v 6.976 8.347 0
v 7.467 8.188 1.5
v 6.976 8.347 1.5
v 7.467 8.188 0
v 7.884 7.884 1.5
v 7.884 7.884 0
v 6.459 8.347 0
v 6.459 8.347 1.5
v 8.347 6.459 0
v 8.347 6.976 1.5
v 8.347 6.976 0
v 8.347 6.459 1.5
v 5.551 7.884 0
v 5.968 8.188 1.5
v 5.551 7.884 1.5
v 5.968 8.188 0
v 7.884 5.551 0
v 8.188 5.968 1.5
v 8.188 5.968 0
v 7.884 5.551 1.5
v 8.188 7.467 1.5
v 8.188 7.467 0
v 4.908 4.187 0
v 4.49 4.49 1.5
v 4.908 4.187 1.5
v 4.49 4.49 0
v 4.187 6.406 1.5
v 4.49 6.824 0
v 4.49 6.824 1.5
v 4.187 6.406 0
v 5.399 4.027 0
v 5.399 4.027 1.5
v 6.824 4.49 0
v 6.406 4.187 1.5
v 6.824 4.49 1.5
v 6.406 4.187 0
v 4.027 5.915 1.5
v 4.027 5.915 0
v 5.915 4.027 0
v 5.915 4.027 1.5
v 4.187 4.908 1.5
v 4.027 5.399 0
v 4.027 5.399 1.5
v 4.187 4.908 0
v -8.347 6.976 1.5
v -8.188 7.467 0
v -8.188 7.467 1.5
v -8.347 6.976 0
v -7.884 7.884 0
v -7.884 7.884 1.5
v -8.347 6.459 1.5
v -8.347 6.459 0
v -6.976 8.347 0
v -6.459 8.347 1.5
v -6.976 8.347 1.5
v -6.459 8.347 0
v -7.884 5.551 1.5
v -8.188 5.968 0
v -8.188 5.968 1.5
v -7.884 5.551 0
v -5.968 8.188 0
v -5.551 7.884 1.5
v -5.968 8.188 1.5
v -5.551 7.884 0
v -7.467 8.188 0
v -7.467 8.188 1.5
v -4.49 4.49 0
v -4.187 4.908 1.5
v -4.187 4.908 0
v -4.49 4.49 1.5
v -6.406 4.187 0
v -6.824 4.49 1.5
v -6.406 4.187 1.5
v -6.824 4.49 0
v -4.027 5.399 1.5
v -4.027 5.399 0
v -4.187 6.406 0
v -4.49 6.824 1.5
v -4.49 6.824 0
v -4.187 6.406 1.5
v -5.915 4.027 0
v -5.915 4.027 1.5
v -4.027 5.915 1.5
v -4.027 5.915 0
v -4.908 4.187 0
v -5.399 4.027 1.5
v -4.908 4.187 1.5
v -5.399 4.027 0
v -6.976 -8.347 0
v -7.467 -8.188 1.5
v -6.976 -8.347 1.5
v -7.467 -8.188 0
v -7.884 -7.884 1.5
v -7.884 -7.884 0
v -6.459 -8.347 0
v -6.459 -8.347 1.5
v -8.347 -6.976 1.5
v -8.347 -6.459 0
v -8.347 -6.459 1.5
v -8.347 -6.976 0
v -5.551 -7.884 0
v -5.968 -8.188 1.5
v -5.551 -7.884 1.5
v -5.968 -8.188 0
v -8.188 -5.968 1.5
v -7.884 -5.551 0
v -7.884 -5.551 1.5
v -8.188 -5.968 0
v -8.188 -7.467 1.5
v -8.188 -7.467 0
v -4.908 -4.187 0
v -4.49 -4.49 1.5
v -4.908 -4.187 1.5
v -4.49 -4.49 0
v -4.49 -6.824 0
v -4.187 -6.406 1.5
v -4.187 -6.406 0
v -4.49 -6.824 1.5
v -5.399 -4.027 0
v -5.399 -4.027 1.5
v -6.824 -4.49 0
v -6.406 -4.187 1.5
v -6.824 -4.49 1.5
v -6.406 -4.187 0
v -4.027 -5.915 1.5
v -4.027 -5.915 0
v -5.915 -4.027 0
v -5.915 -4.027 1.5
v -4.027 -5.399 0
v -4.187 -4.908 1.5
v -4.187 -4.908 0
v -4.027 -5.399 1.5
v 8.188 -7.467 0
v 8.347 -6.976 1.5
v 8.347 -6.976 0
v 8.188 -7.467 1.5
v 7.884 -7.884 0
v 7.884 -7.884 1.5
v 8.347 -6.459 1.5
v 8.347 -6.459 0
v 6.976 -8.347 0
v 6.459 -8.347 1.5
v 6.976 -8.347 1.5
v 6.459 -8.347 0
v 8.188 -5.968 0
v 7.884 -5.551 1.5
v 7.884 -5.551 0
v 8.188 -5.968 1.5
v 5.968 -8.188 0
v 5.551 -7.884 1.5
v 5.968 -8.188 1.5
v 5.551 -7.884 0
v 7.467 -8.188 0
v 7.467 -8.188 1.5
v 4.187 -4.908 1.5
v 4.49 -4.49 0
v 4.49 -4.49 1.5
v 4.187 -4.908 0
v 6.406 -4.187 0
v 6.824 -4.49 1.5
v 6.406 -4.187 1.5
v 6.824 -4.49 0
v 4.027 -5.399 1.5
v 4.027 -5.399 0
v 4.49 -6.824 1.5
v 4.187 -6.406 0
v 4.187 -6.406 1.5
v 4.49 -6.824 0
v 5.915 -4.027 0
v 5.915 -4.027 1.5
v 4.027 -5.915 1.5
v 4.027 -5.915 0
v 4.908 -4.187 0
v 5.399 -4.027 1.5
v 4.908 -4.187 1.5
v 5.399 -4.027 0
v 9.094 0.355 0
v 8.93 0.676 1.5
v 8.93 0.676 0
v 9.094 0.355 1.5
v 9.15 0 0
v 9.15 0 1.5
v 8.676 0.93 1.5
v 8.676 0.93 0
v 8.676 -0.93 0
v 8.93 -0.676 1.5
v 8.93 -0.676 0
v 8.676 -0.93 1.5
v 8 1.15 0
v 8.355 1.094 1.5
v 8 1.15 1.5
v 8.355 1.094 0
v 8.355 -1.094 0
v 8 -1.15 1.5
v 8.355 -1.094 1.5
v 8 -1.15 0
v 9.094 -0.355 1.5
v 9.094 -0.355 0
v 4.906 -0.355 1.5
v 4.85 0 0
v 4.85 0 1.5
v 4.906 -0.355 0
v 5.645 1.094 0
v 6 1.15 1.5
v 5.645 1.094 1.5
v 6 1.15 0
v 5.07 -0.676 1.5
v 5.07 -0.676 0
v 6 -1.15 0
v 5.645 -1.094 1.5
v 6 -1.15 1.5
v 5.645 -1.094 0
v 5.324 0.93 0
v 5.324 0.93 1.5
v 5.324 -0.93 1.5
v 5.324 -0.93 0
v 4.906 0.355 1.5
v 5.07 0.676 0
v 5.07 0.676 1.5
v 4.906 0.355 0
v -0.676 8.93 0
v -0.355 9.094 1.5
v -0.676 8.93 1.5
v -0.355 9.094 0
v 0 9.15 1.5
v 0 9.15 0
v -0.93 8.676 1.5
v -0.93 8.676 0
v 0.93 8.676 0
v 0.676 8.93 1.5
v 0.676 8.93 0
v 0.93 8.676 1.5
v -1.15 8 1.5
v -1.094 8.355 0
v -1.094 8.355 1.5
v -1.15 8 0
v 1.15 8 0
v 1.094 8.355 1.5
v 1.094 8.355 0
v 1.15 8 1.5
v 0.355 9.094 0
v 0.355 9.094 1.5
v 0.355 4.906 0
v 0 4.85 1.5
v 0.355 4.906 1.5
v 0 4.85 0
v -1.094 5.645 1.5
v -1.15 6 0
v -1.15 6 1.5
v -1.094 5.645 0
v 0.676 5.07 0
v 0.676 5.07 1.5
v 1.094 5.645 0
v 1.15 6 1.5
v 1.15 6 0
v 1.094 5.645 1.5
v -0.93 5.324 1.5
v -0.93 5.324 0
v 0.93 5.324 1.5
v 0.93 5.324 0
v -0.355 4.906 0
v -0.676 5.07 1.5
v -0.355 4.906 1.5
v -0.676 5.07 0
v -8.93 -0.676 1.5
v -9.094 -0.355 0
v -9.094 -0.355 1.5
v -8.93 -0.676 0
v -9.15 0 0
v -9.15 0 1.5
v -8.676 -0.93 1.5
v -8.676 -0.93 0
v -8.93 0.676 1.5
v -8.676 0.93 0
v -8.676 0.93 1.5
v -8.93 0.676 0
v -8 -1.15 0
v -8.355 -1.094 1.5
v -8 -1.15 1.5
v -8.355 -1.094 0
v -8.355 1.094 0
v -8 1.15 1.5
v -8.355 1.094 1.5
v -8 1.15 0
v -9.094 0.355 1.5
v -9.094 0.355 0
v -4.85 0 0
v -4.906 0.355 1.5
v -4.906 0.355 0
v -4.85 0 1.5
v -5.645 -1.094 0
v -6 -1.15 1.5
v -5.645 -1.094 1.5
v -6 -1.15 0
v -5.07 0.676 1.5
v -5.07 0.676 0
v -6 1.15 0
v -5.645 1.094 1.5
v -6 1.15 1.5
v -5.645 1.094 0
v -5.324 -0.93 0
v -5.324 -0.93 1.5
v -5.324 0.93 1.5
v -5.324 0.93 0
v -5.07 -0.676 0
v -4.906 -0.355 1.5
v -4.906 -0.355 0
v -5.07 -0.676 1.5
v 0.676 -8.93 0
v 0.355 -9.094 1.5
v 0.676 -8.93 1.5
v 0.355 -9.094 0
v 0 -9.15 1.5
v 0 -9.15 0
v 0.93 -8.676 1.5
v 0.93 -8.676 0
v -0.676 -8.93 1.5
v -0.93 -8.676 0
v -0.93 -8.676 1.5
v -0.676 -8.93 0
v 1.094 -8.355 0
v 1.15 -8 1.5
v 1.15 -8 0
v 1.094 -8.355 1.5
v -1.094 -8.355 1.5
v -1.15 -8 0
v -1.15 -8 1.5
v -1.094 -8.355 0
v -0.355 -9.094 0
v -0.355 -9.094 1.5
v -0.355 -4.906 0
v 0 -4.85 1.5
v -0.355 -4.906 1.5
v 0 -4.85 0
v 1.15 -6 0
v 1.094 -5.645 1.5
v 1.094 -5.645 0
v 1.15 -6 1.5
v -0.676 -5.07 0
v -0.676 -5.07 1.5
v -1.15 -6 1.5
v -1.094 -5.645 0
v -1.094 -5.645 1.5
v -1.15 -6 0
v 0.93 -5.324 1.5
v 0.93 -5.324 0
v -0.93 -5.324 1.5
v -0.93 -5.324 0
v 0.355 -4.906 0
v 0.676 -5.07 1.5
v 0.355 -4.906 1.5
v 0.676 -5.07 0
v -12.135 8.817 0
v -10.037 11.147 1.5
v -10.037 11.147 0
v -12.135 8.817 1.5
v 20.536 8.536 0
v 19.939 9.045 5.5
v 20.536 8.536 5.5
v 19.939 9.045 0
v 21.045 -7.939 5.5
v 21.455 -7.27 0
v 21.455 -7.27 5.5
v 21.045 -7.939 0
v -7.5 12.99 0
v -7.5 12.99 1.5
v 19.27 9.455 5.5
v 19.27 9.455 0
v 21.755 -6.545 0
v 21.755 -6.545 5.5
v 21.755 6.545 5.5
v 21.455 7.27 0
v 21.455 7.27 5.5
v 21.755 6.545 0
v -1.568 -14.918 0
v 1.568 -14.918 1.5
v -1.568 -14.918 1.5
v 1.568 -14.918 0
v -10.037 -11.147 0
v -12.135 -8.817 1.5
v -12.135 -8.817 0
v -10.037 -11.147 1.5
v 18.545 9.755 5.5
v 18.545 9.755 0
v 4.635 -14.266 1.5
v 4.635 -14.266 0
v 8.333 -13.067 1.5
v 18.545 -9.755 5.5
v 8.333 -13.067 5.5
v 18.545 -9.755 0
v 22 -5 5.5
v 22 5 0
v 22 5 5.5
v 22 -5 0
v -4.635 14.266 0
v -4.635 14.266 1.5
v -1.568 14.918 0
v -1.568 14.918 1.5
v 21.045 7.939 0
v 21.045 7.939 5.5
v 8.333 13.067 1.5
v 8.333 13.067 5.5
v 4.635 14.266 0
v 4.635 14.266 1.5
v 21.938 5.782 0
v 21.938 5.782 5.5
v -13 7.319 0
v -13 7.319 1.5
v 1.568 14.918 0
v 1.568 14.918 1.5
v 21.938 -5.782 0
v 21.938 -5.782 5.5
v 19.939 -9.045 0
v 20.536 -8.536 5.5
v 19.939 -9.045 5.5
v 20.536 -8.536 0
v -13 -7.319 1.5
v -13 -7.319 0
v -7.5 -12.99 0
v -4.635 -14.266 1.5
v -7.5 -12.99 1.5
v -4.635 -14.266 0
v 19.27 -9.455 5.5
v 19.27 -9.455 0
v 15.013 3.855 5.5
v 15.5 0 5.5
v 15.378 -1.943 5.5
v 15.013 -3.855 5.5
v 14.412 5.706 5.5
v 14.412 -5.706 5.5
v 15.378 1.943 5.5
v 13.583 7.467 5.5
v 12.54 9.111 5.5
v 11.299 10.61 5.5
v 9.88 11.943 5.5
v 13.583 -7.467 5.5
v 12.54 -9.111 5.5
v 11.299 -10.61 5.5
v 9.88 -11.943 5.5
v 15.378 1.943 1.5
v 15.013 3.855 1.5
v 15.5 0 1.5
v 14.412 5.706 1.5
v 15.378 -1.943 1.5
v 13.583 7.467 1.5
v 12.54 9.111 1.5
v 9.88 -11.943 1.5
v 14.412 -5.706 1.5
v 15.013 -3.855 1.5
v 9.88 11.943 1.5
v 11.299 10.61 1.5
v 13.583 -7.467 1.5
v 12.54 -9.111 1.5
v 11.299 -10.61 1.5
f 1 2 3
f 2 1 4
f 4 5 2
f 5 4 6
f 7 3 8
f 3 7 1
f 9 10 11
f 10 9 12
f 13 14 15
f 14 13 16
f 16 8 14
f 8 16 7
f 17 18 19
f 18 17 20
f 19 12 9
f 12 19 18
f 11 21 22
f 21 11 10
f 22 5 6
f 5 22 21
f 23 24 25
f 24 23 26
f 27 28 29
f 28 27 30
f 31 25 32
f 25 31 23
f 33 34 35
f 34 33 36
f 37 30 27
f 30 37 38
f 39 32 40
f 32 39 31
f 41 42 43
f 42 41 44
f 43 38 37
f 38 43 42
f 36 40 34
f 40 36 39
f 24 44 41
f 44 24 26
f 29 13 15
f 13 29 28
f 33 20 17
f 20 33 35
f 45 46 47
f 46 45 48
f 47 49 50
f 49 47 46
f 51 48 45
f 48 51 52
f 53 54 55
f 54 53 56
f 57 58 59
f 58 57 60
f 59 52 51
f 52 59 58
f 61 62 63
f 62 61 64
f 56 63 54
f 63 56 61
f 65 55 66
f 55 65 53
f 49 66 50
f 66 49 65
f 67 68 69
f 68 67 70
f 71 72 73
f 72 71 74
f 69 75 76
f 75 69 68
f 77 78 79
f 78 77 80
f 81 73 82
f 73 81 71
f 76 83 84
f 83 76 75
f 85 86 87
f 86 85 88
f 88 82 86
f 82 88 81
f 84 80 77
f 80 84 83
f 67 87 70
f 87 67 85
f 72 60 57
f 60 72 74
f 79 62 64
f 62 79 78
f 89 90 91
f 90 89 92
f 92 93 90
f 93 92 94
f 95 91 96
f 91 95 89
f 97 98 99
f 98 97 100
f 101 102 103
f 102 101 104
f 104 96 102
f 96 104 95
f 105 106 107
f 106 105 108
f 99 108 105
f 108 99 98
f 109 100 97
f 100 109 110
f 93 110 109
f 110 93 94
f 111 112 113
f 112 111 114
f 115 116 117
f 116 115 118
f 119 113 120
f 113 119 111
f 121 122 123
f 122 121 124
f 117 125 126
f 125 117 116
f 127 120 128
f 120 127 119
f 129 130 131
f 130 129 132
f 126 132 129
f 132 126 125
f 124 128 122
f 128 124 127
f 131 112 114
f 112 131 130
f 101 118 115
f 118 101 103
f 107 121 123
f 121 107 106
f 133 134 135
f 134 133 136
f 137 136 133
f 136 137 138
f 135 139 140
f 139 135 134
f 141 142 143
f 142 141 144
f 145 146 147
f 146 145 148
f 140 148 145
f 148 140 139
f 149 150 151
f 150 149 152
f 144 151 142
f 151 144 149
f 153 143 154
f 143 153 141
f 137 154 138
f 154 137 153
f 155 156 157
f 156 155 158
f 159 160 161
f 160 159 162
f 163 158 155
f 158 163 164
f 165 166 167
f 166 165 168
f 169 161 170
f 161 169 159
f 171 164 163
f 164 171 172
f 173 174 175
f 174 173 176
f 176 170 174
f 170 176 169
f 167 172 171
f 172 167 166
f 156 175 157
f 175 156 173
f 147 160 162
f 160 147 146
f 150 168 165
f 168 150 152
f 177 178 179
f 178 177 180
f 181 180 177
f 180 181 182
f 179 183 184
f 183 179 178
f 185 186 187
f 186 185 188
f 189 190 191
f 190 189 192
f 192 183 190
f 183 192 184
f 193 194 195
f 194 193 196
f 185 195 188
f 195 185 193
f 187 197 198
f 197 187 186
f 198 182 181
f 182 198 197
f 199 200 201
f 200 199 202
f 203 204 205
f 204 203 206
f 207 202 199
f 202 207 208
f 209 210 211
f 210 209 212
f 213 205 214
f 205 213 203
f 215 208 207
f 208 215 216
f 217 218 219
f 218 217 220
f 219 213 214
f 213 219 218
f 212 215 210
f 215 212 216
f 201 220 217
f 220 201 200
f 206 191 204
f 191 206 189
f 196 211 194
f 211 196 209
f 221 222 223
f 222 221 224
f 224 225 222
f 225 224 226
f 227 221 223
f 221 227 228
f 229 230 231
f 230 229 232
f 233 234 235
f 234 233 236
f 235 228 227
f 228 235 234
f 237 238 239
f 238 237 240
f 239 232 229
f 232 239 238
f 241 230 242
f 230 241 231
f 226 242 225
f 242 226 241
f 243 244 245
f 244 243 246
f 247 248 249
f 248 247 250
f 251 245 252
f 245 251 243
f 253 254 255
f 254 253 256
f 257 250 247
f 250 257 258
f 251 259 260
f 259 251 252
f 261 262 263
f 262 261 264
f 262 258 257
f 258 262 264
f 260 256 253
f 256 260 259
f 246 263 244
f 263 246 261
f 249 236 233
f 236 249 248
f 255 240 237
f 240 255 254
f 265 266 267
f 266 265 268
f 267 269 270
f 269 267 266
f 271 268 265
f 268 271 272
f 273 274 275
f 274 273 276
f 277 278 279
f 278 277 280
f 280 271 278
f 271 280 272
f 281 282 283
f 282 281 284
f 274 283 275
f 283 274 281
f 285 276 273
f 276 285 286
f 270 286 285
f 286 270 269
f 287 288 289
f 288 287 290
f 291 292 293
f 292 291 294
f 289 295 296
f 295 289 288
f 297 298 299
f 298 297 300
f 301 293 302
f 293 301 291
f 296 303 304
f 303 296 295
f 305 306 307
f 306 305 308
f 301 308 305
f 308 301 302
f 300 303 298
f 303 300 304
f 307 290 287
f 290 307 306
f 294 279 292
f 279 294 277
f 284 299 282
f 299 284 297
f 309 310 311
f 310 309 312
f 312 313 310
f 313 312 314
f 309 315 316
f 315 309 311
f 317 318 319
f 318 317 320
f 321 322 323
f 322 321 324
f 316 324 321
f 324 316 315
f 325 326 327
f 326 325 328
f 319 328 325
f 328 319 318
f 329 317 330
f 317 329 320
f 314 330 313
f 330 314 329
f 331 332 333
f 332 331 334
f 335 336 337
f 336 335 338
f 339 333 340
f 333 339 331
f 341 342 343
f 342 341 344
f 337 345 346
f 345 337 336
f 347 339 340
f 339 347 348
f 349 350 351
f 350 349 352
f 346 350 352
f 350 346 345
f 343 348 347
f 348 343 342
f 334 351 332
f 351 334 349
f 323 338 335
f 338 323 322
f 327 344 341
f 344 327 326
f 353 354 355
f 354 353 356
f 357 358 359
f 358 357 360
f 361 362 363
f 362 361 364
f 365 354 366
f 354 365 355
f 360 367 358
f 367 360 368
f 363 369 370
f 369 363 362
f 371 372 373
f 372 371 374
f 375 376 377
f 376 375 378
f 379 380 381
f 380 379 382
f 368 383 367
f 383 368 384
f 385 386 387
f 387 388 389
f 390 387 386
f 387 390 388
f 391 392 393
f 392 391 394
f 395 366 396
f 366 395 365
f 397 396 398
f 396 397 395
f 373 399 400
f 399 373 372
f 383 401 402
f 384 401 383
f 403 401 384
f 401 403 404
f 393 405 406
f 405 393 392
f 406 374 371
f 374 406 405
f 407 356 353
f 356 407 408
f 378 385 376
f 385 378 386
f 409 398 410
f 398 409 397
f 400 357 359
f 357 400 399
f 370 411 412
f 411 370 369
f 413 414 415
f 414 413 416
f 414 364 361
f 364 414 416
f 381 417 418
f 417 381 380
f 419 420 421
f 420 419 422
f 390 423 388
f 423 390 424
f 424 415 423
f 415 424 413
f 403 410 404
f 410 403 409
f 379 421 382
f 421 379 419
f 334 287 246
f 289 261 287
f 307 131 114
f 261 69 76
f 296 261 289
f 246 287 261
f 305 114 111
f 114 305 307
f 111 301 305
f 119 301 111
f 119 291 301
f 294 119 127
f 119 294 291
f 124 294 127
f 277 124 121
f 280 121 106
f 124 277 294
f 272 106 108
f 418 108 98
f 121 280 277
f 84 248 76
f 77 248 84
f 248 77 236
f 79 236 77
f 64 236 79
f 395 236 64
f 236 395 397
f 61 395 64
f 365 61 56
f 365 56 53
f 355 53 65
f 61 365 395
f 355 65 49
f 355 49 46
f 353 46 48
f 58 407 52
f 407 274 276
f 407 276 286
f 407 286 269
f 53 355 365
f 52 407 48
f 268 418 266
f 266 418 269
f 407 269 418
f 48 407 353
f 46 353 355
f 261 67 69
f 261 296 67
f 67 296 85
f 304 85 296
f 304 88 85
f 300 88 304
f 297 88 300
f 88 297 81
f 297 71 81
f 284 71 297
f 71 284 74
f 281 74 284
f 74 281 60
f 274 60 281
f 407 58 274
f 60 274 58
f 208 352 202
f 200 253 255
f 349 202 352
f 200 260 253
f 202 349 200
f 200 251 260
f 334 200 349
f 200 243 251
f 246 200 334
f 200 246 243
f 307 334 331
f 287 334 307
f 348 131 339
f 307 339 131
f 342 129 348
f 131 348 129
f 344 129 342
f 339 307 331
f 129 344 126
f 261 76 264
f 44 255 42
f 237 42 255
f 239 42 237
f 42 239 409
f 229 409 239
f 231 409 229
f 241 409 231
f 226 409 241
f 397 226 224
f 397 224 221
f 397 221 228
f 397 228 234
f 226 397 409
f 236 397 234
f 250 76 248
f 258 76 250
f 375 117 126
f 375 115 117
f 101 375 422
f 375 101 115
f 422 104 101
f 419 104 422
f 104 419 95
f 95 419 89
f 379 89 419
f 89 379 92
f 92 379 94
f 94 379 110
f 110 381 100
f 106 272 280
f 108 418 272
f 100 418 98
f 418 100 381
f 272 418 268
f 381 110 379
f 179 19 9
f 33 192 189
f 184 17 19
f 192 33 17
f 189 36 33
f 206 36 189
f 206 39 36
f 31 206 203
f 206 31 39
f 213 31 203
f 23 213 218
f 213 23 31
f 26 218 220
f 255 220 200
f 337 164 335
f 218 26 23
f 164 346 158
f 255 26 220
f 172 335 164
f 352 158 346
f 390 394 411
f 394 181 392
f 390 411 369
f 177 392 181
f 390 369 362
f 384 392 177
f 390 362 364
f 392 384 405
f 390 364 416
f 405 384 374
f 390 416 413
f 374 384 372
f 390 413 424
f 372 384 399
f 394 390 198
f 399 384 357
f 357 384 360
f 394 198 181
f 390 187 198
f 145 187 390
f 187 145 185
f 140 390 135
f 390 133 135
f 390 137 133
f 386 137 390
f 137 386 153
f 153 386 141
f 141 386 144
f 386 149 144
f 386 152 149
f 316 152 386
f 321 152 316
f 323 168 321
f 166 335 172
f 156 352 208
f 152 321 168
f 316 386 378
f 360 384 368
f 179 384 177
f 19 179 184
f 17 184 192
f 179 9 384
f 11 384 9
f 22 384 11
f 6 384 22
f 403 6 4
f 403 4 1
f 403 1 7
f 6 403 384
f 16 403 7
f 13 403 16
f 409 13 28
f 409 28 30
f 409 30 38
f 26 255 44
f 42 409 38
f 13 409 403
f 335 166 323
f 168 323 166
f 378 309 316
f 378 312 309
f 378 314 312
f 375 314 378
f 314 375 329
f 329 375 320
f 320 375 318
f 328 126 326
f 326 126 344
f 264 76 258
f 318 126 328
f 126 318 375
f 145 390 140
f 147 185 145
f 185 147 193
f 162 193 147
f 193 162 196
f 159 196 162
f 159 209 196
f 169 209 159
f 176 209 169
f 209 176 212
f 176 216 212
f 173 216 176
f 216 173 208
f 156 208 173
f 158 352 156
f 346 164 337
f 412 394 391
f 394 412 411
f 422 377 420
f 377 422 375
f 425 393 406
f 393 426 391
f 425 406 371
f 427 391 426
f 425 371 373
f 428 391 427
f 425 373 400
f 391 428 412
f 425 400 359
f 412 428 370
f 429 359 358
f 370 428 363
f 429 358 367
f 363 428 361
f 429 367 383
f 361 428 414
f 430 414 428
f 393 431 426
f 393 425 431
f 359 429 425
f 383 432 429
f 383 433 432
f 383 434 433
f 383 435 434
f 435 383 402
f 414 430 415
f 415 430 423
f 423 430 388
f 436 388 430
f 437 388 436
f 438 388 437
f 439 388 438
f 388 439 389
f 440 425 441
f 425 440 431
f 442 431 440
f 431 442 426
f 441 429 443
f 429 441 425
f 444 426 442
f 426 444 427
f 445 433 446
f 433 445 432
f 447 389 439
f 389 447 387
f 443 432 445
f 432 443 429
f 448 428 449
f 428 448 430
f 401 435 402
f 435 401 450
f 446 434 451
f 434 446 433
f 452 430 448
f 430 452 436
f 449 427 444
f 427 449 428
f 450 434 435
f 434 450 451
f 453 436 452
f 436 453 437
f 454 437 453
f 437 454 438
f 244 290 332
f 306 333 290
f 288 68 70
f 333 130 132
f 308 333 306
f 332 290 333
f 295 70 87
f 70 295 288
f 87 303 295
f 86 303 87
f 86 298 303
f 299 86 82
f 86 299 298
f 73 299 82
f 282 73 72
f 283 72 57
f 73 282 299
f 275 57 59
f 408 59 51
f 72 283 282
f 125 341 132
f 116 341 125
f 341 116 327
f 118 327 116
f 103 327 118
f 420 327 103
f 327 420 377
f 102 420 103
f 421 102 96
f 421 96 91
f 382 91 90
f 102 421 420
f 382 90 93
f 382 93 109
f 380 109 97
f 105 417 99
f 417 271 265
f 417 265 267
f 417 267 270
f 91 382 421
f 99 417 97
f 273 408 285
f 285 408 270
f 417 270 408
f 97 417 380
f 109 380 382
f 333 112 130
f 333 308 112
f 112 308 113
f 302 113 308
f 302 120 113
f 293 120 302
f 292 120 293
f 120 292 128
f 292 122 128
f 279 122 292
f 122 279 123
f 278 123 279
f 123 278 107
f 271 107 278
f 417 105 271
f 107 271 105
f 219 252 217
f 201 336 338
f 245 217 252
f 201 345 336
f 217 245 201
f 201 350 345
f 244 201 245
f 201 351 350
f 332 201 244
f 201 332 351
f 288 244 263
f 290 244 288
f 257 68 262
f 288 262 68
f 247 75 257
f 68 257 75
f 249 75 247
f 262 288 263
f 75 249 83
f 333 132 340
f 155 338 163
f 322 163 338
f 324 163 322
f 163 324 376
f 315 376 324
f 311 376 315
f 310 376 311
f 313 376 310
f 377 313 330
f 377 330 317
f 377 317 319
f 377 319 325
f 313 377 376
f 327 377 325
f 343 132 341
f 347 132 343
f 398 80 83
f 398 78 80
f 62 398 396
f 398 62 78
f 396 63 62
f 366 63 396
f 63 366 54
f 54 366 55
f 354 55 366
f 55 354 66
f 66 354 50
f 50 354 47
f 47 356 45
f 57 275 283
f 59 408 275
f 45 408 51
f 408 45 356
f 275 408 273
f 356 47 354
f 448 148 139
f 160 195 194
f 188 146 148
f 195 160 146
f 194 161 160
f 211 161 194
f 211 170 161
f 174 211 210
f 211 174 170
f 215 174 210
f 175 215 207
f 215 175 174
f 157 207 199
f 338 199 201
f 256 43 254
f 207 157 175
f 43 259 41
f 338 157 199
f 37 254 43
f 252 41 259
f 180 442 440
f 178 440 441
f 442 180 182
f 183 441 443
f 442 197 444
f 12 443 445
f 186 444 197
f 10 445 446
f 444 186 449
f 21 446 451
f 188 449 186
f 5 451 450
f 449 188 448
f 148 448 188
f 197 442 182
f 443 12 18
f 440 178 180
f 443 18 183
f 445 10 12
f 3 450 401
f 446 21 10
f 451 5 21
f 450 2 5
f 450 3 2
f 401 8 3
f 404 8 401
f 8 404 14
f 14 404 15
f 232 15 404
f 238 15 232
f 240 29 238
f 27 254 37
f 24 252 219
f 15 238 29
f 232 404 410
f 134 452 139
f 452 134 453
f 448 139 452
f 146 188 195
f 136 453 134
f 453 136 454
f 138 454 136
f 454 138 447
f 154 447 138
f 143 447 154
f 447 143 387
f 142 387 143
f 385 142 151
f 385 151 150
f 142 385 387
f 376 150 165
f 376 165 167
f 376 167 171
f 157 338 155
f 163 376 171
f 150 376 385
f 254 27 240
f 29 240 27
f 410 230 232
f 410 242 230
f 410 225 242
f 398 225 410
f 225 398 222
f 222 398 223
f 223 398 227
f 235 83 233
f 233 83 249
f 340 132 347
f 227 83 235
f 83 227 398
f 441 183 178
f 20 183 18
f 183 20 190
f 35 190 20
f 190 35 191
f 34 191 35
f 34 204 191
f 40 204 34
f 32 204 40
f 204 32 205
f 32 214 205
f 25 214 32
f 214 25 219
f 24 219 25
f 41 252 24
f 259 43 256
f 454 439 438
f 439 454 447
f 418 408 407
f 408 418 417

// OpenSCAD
// file: dronePlates.scad
/**
 * dronePlates.scad
 * Plate library
 *
 * GNU GPL V3
 * @author: Victor Potenciano
 */

m3Rad = 3.4/2;
cornerR = 4;

/**
 *
 */
module helperDisk(diameter) {
	cylinder(r = diameter/2, h = 0.6, $fn=20);
}

/**
 *
 */
module roundedRect(size, radius) {
	x = size[0];
	y = size[1];
	z = size[2];

	linear_extrude(height=z)
	hull() {
	// place 4 circles in the corners, with the given radius
	translate([(-x/2)+(radius/2), (-y/2)+(radius/2), 0]){ circle(r=radius); }
	translate([(x/2)-(radius/2), (-y/2)+(radius/2), 0]){ circle(r=radius); }
	translate([(-x/2)+(radius/2), (y/2)-(radius/2), 0]){ circle(r=radius); }
	translate([(x/2)-(radius/2), (y/2)-(radius/2), 0]){ circle(r=radius); }
	}
}

/**
 * rounded rectangle triangle with corner at origin
 */
module roundedTriangle(size, radius) {
	x = size[0];
	y = size[1];
	z = size[2];

	linear_extrude(height=z)
	hull() {
	translate([radius, radius, 0]){ circle(r=radius); }
	translate([x-radius, radius, 0]){ circle(r=radius); }
	translate([radius, y-radius, 0]){ circle(r=radius); }
	}
}

/**
 *
 */
module roundRectPlate(w, l, plateThick=3) {
	difference(){
		roundedRect([l+m3Rad*1.75,w+m3Rad*1.75,plateThick], cornerR);
		translate([l/2, w/2, -0.5]) { cylinder(h = plateThick+1, r = m3Rad, $fn=30); }
		translate([-l/2, w/2, -0.5]) { cylinder(h = plateThick+1, r = m3Rad, $fn=30); }
		translate([l/2, -w/2, -0.5]) { cylinder(h = plateThick+1, r = m3Rad, $fn=30); }
		translate([-l/2, -w/2, -0.5]) { cylinder(h = plateThick+1, r = m3Rad, $fn=30); }
	}
}

/**
 *
 */
module crossSquarePlate(l, thick=3) {
	inDist = cornerR*2+4;
	trianL = sqrt((l*l)/2)-inDist;
	centerR = 4;

	difference(){
		roundRectPlate(l, l, thick);
		translate([0, centerR, -0.5]) { 
			rotate([0,0,45]){ roundedTriangle([trianL,trianL,thick+1], cornerR-2); }
		}
		translate([0, -centerR, -0.5]) { 
			rotate([0,0,225]){ roundedTriangle([trianL,trianL,thick+1], cornerR-2); }
		}
		translate([-centerR, 0, -0.5]) { 
			rotate([0,0,135]){ roundedTriangle([trianL,trianL,thick+1], cornerR-2); }
		}
		translate([centerR, 0, -0.5]) { 
			rotate([0,0,-45]){ roundedTriangle([trianL,trianL,thick+1], cornerR-2); }
		}
	}
}

/**
 *
 */
module hShapePlate(w, l, thick=4) {
	inDist = cornerR*2+1;

	difference(){
		roundRectPlate(w, l, thick);
		translate([0, w/4, -0.5]) { roundedRect([l-inDist,w/2-inDist,thick+1], cornerR-2); }
		translate([0, -w/4, -0.5]) { roundedRect([l-inDist,w/2-inDist,thick+1], cornerR-2); }
	}
}

/**
 *
 */
module motorCircleMount(inDia, outDia, thick=3, extraH=false, d1=19, d2=16, holeR=m3Rad ) {
	difference(){
		cylinder(h = thick, r = outDia/2, $fn=30);
		motorCircleMountHoles(inDia, outDia, thick, extraH, d1=d1, d2=d2, holeR=holeR);
	}
}

/**
 *
 */
module motorCircleMountHoles(inDia, outDia, thick=3, extraH=false, d1=19, d2=16, d3=25, holeR=m3Rad) {
	translate([0, 0, -0.5]) { cylinder(h = thick+1, r = inDia/2, $fn=30); }

	for(i=[0:3]) {
		rotate([0,0,90*i]){
		translate([d1/2, 0, -0.5]) cylinder(h = thick+1, r = holeR, $fn=20);
		translate([d2/2, 0, -0.5]) cylinder(h = thick+1, r = holeR, $fn=20);
		translate([d2/2, -holeR, -0.5]) cube(size = [(d1-d2)/2,holeR*2,thick+1]);
		}
	}
	
	if(extraH==true){	
		for(i=[-1,1]) translate([i*d3/2, 0, -0.5]) { cylinder(h = thick+1, r = holeR, $fn=30); }
	}
}

/**
 *
 */
module motorRectMount(w, l, inDia, thick=3) {
	d1=19;
	d2=16;

	difference(){
		roundRectPlate(w, l, thick);
		translate([0, 0, -0.5]) { cylinder(h = thick+1, r = inDia/2, $fn=30); }
		translate([0, d1/2, -0.5]) { cylinder(h = thick+1, r = m3Rad, $fn=30); }
		translate([0, -d1/2, -0.5]) { cylinder(h = thick+1, r = m3Rad, $fn=30); }
		translate([d2/2, 0, -0.5]) { cylinder(h = thick+1, r = m3Rad, $fn=30); }
		translate([-d2/2, 0, -0.5]) { cylinder(h = thick+1, r = m3Rad, $fn=30); }
	}
}

/**
 *
 */
module tube(inDia, outDia, height) {
	difference(){
		cylinder(h = height, r = outDia/2, $fn=50);
		translate([0, 0, -0.5]) { cylinder(h = height+1, r = inDia/2, $fn=30); }
	}
}

/**
 *
 */
module squareTube(inDia, outDia, height) {
	translate([0,0,height/2]){
	difference(){
		cube(size = [outDia,outDia,height], center = true);
		cube(size = [inDia,inDia,height+1], center = true);
	}
	}
}

/**
 *
 */
module djiFlamewheelHoles(height) {
	a = 23;
	b = 16;
	c = 19.5;
	
	translate([a/2, c/2, 0]) { cylinder(h = height, r = m3Rad, $fn=30); }
	translate([-a/2, c/2, 0]) { cylinder(h = height, r = m3Rad, $fn=30); }
	translate([b/2, -c/2, 0]) { cylinder(h = height, r = m3Rad, $fn=30); }
	translate([-b/2, -c/2, 0]) { cylinder(h = height, r = m3Rad, $fn=30); }
}

/**
 *
 */
module djiFlamewheelHolesBotton(height) {
	a1 = 21;
	c = 19.5;
	
	translate([a1/2, c/2, 0]) { cylinder(h = height, r = m3Rad, $fn=30); }
	translate([-a1/2, c/2, 0]) { cylinder(h = height, r = m3Rad, $fn=30); }
}

/**
 *
 */
module propeller(size){
union(){
difference(){
	cylinder(h = 3, r = size/2, center=true, $fn=30);
	cylinder(h = 3.1, r = size/2-2, center=true, $fn=30); 
}
for( i = [-1,1] ){
rotate([0,0,45*i]){ cube(size = [size,4,1], center = true); }
}
}
}

/**
 *
 */
module slot(length, height, rad){
for(i=[-1,1]) translate([i*length/2,0,0]) cylinder(h = height, r = rad, $fn=30);
translate([0,0,height/2]) cube(size = [length,rad*2,height], center = true);
}

 

////////////////////////
// Examples:
////////////////////////

motorCircleMount(8, 25, 3.5);

//roundedRect([50,50,3], 4);

//hShapePlate(79, 25);

//rotate([0,0,45]){roundedTriangle([40,40,3], 4);}

//crossSquarePlate(45, 4);

/*
union(){
motorRectMount(21, 18, 8, 4);
translate([9, 10.5, 0]) {tube(m3Rad*2, 6.5, 6);}
}
*/

/*
difference(){
union(){
hShapePlate(50, 30, 3.5);
translate([-4,-25,0]){cube(size = [8,50,3.5]);}
rotate([0, 0, 45]) {motorCircleMount(8, 35, 3.5);}
}
cylinder(h = 10, r = 4, $fn=100, center=true);
}
*/

//rotate([90,0,0]){ tube(5,10,20); }
//translate([20,0,0]){ squareTube(5, 10, 20); }
// main file
/**
 * motor/arm protector
 *
 * @author: Victor Potenciano
 */

use <dronePlates.scad>

m3Rad = 3.3/2;
thick = 1.5;
armThick = 4;
motorD = 30;


difference(){
    hull(){
        cylinder(r=motorD/2, h=armThick+thick, $fn=30);
        
        for(i=[-1,1])
        translate([motorD/2+2,i*5,0]) cylinder(r=5, h=armThick+thick, $fn=40);
    }
    
    translate([0,0,thick])
    cylinder(r=motorD/2+0.5, h=armThick+0.1, $fn=50);
    
    translate([-motorD/2-8,-20,-0.5])
    cube(size=[10,40,10]);
    
    translate([0,0,-0.5]){
    rotate([0,0,45]) motorCircleMountHoles(0, motorD, thick=armThick+1, holeR=m3Rad);
    motorCircleMountHoles(0, motorD, thick=armThick+1, , holeR=2.3/2, d1=16, d2=12);
    }
}//diff
